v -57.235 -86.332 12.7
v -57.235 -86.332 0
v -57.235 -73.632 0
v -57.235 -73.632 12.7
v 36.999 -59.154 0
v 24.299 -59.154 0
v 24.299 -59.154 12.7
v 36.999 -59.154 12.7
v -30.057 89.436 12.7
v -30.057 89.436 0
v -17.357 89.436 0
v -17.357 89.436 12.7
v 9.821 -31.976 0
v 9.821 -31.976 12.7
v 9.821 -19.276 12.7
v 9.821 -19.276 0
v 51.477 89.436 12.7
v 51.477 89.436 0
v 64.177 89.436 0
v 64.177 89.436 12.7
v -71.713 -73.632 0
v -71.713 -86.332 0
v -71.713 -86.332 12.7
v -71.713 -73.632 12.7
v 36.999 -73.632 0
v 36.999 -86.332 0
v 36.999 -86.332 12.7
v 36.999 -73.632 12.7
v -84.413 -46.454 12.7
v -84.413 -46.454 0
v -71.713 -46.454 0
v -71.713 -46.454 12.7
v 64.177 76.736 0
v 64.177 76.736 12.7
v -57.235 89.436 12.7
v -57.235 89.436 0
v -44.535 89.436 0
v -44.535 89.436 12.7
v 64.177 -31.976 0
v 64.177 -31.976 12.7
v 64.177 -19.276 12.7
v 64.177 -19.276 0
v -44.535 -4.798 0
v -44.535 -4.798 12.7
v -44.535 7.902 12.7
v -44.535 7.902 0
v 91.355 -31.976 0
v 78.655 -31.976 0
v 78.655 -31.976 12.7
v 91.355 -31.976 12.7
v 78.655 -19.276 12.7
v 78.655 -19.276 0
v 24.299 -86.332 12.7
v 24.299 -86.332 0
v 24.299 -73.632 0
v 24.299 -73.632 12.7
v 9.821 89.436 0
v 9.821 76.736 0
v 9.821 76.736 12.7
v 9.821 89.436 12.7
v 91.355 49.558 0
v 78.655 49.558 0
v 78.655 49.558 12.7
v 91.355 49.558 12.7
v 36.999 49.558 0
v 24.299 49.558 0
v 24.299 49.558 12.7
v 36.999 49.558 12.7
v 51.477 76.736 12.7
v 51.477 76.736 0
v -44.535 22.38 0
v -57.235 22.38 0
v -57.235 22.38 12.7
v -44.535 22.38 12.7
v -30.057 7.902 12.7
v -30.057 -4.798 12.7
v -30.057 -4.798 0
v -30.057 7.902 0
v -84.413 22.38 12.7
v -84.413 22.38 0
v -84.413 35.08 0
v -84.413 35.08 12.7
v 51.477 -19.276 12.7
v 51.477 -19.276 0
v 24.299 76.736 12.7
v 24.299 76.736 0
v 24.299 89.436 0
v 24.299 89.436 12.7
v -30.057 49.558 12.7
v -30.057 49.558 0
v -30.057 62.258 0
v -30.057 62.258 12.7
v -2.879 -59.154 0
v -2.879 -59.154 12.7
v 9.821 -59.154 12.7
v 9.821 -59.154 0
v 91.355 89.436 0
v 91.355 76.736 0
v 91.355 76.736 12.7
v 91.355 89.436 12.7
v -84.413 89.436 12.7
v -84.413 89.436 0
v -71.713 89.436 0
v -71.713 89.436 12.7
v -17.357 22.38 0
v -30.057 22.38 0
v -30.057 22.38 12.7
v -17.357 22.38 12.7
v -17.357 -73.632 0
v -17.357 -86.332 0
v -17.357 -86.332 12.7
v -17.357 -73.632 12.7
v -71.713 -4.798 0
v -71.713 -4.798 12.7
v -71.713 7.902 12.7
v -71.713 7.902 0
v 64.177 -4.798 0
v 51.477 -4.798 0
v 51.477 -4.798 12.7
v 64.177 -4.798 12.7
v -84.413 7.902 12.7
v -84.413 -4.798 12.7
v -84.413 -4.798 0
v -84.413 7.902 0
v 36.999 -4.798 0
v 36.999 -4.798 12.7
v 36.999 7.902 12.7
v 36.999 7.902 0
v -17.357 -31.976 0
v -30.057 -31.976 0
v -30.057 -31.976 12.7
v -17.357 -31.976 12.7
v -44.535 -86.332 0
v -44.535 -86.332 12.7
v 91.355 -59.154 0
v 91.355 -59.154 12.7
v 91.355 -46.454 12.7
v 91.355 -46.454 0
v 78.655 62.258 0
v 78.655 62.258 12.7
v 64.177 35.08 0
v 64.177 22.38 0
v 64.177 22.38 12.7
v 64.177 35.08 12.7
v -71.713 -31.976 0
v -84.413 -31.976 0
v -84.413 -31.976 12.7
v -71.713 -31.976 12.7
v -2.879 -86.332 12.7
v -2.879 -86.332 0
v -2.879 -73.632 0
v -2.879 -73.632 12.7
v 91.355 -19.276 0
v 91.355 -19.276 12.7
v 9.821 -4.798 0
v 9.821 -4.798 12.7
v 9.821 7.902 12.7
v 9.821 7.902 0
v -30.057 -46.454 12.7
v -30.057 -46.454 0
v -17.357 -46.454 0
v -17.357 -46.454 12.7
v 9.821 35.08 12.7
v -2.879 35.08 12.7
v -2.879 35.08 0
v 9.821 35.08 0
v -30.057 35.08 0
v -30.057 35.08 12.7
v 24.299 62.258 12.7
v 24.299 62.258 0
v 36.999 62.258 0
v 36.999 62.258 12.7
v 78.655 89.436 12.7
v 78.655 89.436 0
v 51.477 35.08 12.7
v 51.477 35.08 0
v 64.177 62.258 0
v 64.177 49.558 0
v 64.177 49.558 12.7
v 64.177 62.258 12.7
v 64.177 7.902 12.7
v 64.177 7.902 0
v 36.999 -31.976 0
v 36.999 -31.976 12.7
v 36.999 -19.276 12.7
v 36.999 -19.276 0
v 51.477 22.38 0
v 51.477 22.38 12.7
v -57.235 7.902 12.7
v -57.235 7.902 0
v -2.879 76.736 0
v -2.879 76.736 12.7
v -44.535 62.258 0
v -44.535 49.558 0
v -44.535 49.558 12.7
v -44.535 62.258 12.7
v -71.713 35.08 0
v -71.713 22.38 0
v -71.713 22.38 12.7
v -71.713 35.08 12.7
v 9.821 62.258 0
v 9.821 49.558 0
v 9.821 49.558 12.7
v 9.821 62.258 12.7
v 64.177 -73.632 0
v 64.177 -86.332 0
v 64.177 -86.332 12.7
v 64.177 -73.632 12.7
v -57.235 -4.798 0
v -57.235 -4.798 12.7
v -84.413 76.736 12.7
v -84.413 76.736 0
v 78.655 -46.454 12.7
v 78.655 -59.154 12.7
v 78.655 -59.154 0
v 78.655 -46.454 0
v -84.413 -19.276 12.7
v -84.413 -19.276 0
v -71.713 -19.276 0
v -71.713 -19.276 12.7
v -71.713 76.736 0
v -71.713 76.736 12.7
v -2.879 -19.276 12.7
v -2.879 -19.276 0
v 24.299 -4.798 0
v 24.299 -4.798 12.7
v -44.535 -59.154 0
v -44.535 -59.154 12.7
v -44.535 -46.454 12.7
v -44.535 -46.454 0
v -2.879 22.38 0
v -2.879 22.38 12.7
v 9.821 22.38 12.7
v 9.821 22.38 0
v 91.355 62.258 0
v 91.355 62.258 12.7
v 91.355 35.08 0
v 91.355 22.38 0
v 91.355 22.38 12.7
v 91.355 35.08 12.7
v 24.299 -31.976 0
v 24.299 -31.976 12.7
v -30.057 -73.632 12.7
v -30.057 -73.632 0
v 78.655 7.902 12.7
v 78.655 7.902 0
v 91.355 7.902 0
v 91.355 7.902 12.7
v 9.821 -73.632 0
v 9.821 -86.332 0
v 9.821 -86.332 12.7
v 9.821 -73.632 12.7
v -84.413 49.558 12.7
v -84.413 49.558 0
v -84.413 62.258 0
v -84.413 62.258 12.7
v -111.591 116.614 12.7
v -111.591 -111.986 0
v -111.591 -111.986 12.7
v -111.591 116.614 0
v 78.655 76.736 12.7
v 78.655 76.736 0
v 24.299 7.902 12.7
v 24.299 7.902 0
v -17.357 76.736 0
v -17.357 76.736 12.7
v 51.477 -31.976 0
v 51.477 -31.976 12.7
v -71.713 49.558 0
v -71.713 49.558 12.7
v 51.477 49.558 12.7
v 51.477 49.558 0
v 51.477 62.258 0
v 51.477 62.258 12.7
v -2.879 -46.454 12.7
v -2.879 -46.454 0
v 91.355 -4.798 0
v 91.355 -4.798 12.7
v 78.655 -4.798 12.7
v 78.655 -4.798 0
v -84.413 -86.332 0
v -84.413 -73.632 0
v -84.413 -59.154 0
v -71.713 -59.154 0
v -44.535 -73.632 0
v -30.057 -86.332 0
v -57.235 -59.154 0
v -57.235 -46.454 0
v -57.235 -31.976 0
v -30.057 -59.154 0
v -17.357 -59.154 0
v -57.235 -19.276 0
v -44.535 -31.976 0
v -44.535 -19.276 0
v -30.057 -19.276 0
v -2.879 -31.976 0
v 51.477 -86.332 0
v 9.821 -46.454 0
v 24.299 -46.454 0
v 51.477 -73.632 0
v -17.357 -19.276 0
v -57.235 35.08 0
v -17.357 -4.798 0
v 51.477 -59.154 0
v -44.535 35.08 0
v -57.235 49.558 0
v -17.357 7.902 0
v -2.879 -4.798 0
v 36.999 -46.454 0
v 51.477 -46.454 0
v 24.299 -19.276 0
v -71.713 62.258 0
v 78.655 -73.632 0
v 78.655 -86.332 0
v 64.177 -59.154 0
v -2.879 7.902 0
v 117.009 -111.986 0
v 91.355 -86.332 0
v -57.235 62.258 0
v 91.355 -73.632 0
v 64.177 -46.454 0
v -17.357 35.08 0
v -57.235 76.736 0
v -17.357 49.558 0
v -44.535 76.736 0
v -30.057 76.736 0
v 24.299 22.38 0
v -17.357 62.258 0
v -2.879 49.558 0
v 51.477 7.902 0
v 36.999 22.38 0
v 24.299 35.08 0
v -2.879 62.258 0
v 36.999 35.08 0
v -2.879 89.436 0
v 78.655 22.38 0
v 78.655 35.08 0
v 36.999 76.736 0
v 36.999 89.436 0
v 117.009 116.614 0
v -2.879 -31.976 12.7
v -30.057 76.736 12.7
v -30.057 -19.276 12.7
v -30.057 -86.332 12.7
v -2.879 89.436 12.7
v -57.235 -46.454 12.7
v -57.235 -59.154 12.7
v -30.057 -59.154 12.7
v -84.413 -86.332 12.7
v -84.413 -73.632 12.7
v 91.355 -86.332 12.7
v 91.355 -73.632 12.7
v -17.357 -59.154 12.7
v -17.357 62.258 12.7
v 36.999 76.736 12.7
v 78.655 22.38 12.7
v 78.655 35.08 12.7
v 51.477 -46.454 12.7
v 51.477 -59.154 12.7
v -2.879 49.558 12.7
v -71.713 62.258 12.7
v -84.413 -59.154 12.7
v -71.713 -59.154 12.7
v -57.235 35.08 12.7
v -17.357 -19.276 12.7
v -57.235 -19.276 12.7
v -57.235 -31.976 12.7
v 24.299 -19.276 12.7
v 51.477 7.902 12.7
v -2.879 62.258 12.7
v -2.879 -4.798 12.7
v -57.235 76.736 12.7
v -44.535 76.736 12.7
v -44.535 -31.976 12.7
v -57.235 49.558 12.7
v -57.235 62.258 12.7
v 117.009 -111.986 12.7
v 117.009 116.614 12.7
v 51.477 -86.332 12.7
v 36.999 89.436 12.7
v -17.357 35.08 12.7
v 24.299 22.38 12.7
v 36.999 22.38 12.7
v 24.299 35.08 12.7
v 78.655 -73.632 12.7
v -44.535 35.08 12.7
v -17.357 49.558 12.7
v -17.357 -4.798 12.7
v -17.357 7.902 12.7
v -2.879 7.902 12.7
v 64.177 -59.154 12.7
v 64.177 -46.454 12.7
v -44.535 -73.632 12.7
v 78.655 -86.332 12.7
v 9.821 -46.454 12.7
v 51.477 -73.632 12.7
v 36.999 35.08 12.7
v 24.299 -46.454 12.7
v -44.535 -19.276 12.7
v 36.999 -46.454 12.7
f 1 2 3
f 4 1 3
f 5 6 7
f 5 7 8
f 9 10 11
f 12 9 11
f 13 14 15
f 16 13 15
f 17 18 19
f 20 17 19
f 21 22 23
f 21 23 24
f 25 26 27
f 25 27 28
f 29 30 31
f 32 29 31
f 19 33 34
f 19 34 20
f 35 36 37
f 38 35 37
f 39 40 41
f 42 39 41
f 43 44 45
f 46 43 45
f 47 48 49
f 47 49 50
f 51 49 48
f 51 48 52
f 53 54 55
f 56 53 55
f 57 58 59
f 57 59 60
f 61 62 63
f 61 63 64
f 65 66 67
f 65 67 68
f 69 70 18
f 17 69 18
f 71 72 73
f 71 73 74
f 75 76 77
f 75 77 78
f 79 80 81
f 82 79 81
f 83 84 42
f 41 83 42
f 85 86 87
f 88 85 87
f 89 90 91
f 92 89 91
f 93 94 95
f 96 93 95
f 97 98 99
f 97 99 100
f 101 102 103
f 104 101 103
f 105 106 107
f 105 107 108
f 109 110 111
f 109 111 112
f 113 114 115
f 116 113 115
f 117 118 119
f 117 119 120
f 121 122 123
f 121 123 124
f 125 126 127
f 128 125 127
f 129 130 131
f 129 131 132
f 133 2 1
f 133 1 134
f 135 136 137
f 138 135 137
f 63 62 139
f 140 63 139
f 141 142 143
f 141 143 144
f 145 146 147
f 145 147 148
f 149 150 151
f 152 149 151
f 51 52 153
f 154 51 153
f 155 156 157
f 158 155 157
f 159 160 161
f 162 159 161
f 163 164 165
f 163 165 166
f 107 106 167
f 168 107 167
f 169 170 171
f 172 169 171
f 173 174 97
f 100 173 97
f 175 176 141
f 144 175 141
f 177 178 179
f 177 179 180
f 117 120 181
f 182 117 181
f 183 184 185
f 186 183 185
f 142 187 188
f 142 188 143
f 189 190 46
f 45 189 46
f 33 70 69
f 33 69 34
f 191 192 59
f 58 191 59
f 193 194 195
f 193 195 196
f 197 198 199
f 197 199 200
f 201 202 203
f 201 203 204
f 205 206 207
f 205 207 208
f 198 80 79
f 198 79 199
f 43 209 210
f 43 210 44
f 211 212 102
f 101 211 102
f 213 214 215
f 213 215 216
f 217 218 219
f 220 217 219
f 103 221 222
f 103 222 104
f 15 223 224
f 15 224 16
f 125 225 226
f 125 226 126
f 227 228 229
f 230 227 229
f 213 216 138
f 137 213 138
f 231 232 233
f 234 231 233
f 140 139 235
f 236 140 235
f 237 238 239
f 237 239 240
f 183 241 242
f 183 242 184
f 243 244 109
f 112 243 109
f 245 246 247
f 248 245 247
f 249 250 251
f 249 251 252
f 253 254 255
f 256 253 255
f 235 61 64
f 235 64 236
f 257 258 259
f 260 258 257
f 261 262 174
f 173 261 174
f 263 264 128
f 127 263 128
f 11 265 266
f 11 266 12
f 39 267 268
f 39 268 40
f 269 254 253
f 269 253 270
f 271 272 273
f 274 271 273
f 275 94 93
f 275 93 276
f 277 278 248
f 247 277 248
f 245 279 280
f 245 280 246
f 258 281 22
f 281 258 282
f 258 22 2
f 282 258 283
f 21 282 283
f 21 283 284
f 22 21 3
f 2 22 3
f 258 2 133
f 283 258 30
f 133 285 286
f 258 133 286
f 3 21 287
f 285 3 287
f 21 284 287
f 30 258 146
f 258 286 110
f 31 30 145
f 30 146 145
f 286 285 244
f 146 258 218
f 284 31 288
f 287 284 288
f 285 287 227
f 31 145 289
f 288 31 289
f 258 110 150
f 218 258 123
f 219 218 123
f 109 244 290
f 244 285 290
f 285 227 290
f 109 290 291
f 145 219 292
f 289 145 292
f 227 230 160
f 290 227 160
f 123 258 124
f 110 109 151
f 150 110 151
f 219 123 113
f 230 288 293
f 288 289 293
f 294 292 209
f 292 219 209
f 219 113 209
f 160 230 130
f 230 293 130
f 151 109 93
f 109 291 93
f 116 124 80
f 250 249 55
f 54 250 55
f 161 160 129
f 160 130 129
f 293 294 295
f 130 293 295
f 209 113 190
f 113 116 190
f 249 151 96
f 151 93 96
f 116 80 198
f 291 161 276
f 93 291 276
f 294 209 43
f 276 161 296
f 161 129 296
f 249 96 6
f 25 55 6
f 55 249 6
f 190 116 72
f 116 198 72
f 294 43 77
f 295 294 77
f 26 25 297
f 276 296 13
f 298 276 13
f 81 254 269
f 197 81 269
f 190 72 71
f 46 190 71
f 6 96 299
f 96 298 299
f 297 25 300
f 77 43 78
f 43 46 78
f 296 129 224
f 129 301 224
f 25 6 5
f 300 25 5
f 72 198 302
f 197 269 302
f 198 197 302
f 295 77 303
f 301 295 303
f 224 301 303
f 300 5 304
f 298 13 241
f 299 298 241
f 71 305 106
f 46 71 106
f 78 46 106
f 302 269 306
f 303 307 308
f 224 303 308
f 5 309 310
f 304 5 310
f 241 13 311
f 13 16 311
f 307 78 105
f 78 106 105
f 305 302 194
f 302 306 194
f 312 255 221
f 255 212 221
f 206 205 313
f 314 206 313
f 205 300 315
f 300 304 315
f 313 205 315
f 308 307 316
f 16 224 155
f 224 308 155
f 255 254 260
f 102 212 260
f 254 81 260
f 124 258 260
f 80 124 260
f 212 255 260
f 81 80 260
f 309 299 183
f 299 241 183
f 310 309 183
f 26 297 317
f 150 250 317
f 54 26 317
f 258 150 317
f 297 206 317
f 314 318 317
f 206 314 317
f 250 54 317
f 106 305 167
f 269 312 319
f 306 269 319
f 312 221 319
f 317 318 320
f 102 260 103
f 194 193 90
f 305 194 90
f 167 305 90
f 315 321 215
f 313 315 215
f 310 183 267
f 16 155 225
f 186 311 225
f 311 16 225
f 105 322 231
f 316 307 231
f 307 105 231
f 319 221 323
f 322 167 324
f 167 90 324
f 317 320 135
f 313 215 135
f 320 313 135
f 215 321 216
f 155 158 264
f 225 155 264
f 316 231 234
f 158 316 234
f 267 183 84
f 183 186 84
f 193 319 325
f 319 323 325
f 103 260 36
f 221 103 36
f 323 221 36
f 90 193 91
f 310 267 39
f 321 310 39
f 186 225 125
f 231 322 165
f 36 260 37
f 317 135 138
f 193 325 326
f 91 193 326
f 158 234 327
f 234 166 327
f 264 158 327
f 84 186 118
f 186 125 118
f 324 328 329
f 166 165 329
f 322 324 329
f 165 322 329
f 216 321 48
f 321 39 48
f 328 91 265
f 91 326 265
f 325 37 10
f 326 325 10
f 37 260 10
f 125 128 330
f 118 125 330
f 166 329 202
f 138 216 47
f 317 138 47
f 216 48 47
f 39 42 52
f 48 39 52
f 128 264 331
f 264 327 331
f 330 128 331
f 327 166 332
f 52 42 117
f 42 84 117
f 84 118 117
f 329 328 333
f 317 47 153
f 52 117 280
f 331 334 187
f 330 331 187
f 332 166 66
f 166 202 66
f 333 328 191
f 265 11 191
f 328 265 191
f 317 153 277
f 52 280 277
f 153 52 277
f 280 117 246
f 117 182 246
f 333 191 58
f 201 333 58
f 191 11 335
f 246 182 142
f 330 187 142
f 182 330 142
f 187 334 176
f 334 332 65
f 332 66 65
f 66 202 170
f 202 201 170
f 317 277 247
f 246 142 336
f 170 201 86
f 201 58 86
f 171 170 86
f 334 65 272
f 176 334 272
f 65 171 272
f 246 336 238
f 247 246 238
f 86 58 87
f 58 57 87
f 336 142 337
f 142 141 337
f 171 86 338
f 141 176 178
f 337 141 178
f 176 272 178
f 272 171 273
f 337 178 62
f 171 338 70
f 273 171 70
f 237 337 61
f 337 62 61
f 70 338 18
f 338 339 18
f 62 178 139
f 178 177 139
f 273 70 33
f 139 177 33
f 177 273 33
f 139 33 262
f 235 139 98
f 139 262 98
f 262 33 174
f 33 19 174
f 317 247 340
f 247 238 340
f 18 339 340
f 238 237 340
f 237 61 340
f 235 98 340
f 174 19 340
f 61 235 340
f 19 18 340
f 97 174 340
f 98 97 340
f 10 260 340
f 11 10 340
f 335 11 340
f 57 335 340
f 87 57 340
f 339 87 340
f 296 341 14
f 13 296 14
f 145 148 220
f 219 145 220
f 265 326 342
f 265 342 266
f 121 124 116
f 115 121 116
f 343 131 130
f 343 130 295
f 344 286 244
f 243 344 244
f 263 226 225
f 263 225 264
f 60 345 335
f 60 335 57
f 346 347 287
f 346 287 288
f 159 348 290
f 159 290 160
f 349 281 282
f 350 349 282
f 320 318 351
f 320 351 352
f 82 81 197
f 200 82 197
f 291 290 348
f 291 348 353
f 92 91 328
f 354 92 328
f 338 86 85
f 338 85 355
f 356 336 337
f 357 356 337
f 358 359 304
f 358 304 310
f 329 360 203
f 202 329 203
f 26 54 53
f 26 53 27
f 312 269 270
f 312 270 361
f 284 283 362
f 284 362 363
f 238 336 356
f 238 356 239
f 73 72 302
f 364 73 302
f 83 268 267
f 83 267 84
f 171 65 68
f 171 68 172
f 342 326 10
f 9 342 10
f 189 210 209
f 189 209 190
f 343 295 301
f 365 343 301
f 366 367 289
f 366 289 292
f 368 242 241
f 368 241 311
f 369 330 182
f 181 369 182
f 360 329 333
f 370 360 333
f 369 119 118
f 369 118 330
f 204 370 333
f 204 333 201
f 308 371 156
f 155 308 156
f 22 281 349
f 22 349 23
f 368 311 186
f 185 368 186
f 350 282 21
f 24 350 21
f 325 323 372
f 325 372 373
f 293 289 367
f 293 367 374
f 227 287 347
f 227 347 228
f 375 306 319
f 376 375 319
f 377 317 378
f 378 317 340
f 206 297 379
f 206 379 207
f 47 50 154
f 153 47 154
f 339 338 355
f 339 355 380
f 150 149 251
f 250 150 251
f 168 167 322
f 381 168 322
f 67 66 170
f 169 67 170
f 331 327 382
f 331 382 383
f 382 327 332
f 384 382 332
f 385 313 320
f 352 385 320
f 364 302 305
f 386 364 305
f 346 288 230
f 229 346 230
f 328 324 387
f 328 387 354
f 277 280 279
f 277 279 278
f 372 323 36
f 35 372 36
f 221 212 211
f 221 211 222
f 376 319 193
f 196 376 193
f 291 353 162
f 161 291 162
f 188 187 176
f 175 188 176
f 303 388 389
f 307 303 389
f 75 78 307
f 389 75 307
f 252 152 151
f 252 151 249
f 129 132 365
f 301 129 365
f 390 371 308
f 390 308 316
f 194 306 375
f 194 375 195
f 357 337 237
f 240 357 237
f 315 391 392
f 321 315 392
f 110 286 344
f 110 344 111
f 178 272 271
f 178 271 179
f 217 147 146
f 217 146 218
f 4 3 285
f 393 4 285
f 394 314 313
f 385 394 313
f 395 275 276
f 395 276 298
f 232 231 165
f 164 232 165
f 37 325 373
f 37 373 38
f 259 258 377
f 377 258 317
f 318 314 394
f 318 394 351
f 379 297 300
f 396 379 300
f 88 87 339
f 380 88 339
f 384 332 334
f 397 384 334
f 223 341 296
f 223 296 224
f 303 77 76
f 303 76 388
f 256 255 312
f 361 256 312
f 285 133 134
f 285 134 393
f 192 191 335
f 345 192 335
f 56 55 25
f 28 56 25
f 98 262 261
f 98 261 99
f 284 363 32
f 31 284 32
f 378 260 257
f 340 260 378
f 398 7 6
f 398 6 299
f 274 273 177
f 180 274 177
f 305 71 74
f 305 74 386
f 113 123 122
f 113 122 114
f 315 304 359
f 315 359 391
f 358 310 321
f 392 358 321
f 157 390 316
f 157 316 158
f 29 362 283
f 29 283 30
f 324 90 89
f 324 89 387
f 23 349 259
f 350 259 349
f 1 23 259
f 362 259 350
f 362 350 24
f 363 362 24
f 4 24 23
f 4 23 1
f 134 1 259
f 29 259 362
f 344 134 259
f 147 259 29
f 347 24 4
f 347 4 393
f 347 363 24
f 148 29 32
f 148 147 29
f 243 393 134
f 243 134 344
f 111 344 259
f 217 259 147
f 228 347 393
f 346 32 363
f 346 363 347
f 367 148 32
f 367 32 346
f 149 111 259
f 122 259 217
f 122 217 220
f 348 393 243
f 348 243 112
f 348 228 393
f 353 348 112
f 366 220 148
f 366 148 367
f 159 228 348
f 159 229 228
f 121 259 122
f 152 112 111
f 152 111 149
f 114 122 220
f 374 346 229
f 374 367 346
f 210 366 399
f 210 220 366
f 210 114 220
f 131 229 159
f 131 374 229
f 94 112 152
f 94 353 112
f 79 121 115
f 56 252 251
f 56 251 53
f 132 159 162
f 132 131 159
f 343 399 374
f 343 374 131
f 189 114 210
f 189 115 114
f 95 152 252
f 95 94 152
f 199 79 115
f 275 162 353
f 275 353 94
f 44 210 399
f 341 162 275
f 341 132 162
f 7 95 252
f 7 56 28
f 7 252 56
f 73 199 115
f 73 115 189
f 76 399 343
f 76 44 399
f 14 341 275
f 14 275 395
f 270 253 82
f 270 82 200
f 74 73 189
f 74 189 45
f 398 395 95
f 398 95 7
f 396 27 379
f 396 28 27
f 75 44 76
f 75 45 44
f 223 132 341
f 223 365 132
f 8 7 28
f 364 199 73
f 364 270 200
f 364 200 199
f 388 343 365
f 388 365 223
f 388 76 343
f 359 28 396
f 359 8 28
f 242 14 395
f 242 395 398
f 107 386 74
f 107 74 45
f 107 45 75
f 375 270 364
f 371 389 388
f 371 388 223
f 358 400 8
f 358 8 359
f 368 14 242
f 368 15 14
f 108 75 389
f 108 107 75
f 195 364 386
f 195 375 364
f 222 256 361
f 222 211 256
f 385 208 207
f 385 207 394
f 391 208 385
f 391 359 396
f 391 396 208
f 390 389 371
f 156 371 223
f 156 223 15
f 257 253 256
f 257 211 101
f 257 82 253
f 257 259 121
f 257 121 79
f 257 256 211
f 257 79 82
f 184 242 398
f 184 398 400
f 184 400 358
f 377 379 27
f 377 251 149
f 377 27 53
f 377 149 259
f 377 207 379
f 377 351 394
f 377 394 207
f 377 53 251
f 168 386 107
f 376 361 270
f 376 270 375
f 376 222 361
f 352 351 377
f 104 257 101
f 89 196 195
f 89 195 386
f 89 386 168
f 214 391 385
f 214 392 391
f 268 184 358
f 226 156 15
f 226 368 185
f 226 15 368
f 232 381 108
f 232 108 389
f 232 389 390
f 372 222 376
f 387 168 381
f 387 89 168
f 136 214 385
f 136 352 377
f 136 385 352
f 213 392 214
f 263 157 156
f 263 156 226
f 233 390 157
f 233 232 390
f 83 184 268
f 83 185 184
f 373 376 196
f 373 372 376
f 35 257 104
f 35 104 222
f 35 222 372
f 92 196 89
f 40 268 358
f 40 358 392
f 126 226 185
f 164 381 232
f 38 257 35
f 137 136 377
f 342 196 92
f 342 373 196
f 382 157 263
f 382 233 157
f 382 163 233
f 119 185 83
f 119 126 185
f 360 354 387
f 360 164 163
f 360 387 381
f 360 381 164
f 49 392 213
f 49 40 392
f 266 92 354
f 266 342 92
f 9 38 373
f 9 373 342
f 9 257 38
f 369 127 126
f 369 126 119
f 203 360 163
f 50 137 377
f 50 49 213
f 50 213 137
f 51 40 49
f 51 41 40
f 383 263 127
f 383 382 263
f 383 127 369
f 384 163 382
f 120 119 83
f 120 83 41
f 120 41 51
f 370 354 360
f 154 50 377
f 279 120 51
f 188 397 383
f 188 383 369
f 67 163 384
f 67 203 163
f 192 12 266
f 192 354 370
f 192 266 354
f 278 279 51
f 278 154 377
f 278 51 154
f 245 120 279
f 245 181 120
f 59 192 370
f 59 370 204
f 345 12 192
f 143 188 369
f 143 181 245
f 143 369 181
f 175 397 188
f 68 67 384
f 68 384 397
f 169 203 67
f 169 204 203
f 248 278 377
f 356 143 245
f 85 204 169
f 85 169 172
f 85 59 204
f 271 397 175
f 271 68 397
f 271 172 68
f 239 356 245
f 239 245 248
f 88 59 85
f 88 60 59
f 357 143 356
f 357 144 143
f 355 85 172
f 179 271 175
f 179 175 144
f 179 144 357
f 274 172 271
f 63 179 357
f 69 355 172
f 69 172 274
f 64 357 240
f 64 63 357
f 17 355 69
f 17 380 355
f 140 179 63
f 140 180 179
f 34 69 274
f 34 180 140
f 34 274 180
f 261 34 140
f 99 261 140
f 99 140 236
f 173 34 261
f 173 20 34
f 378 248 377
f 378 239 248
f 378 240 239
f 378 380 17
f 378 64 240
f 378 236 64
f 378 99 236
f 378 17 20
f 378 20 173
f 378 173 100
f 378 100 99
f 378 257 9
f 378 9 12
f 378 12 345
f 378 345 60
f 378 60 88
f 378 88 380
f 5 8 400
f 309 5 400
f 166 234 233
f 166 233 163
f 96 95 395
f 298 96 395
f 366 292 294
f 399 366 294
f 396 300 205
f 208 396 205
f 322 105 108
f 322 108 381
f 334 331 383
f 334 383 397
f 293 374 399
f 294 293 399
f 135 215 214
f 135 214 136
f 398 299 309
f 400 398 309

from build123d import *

# Parameters (mm, degrees)
F0_W     = 228.6
F0_H     = 228.6
F1_DEPTH = 12.7
F2_W     = 12.7
F2_H     = 12.7
F3_DEPTH = 25.4


with BuildPart() as f1:
    # F0 (on Top) → F1 (new body)
    with BuildSketch(Plane.XY):
        with Locations((2.709044, 2.314238)):
            Rectangle(F0_W, F0_H)
    extrude(amount=F1_DEPTH)

    # F2 (on face) → F3 (cut)
    with BuildSketch(Plane.XY.offset(12.7)):
        with Locations((-78.062956, 83.086238)):
            Rectangle(F2_W, F2_H)
        with Locations((-50.884956, 83.086238)):
            Rectangle(F2_W, F2_H)
        with Locations((-23.706956, 83.086238)):
            Rectangle(F2_W, F2_H)
        with Locations((3.471044, 83.086238)):
            Rectangle(F2_W, F2_H)
        with Locations((30.649044, 83.086238)):
            Rectangle(F2_W, F2_H)
        with Locations((57.827044, 83.086238)):
            Rectangle(F2_W, F2_H)
        with Locations((85.005044, 83.086238)):
            Rectangle(F2_W, F2_H)
        with Locations((85.005044, 55.908238)):
            Rectangle(F2_W, F2_H)
        with Locations((57.827044, 55.908238)):
            Rectangle(F2_W, F2_H)
        with Locations((30.649044, 55.908238)):
            Rectangle(F2_W, F2_H)
        with Locations((3.471044, 55.908238)):
            Rectangle(F2_W, F2_H)
        with Locations((-23.706956, 55.908238)):
            Rectangle(F2_W, F2_H)
        with Locations((-50.884956, 55.908238)):
            Rectangle(F2_W, F2_H)
        with Locations((-78.062956, 55.908238)):
            Rectangle(F2_W, F2_H)
        with Locations((-78.062956, 28.730238)):
            Rectangle(F2_W, F2_H)
        with Locations((-50.884956, 28.730238)):
            Rectangle(F2_W, F2_H)
        with Locations((-23.706956, 28.730238)):
            Rectangle(F2_W, F2_H)
        with Locations((3.471044, 28.730238)):
            Rectangle(F2_W, F2_H)
        with Locations((30.649044, 28.730238)):
            Rectangle(F2_W, F2_H)
        with Locations((57.827044, 28.730238)):
            Rectangle(F2_W, F2_H)
        with Locations((85.005044, 28.730238)):
            Rectangle(F2_W, F2_H)
        with Locations((57.827044, 1.552238)):
            Rectangle(F2_W, F2_H)
        with Locations((30.649044, 1.552238)):
            Rectangle(F2_W, F2_H)
        with Locations((85.005044, 1.552238)):
            Rectangle(F2_W, F2_H)
        with Locations((3.471044, 1.552238)):
            Rectangle(F2_W, F2_H)
        with Locations((-23.706956, 1.552238)):
            Rectangle(F2_W, F2_H)
        with Locations((-50.884956, 1.552238)):
            Rectangle(F2_W, F2_H)
        with Locations((-78.062956, 1.552238)):
            Rectangle(F2_W, F2_H)
        with Locations((-78.062956, -25.625762)):
            Rectangle(F2_W, F2_H)
        with Locations((-78.062956, -52.803762)):
            Rectangle(F2_W, F2_H)
        with Locations((-78.062956, -79.981762)):
            Rectangle(F2_W, F2_H)
        with Locations((-50.884956, -79.981762)):
            Rectangle(F2_W, F2_H)
        with Locations((-50.884956, -52.803762)):
            Rectangle(F2_W, F2_H)
        with Locations((-50.884956, -25.625762)):
            Rectangle(F2_W, F2_H)
        with Locations((-23.706956, -25.625762)):
            Rectangle(F2_W, F2_H)
        with Locations((-23.706956, -52.803762)):
            Rectangle(F2_W, F2_H)
        with Locations((-23.706956, -79.981762)):
            Rectangle(F2_W, F2_H)
        with Locations((3.471044, -79.981762)):
            Rectangle(F2_W, F2_H)
        with Locations((3.471044, -52.803762)):
            Rectangle(F2_W, F2_H)
        with Locations((3.471044, -25.625762)):
            Rectangle(F2_W, F2_H)
        with Locations((30.649044, -25.625762)):
            Rectangle(F2_W, F2_H)
        with Locations((30.649044, -52.803762)):
            Rectangle(F2_W, F2_H)
        with Locations((30.649044, -79.981762)):
            Rectangle(F2_W, F2_H)
        with Locations((57.827044, -79.981762)):
            Rectangle(F2_W, F2_H)
        with Locations((57.827044, -52.803762)):
            Rectangle(F2_W, F2_H)
        with Locations((57.827044, -25.625762)):
            Rectangle(F2_W, F2_H)
        with Locations((85.005044, -25.625762)):
            Rectangle(F2_W, F2_H)
        with Locations((85.005044, -52.803762)):
            Rectangle(F2_W, F2_H)
        with Locations((85.005044, -79.981762)):
            Rectangle(F2_W, F2_H)
    extrude(amount=-F3_DEPTH, mode=Mode.SUBTRACT)


solid = f1.part
